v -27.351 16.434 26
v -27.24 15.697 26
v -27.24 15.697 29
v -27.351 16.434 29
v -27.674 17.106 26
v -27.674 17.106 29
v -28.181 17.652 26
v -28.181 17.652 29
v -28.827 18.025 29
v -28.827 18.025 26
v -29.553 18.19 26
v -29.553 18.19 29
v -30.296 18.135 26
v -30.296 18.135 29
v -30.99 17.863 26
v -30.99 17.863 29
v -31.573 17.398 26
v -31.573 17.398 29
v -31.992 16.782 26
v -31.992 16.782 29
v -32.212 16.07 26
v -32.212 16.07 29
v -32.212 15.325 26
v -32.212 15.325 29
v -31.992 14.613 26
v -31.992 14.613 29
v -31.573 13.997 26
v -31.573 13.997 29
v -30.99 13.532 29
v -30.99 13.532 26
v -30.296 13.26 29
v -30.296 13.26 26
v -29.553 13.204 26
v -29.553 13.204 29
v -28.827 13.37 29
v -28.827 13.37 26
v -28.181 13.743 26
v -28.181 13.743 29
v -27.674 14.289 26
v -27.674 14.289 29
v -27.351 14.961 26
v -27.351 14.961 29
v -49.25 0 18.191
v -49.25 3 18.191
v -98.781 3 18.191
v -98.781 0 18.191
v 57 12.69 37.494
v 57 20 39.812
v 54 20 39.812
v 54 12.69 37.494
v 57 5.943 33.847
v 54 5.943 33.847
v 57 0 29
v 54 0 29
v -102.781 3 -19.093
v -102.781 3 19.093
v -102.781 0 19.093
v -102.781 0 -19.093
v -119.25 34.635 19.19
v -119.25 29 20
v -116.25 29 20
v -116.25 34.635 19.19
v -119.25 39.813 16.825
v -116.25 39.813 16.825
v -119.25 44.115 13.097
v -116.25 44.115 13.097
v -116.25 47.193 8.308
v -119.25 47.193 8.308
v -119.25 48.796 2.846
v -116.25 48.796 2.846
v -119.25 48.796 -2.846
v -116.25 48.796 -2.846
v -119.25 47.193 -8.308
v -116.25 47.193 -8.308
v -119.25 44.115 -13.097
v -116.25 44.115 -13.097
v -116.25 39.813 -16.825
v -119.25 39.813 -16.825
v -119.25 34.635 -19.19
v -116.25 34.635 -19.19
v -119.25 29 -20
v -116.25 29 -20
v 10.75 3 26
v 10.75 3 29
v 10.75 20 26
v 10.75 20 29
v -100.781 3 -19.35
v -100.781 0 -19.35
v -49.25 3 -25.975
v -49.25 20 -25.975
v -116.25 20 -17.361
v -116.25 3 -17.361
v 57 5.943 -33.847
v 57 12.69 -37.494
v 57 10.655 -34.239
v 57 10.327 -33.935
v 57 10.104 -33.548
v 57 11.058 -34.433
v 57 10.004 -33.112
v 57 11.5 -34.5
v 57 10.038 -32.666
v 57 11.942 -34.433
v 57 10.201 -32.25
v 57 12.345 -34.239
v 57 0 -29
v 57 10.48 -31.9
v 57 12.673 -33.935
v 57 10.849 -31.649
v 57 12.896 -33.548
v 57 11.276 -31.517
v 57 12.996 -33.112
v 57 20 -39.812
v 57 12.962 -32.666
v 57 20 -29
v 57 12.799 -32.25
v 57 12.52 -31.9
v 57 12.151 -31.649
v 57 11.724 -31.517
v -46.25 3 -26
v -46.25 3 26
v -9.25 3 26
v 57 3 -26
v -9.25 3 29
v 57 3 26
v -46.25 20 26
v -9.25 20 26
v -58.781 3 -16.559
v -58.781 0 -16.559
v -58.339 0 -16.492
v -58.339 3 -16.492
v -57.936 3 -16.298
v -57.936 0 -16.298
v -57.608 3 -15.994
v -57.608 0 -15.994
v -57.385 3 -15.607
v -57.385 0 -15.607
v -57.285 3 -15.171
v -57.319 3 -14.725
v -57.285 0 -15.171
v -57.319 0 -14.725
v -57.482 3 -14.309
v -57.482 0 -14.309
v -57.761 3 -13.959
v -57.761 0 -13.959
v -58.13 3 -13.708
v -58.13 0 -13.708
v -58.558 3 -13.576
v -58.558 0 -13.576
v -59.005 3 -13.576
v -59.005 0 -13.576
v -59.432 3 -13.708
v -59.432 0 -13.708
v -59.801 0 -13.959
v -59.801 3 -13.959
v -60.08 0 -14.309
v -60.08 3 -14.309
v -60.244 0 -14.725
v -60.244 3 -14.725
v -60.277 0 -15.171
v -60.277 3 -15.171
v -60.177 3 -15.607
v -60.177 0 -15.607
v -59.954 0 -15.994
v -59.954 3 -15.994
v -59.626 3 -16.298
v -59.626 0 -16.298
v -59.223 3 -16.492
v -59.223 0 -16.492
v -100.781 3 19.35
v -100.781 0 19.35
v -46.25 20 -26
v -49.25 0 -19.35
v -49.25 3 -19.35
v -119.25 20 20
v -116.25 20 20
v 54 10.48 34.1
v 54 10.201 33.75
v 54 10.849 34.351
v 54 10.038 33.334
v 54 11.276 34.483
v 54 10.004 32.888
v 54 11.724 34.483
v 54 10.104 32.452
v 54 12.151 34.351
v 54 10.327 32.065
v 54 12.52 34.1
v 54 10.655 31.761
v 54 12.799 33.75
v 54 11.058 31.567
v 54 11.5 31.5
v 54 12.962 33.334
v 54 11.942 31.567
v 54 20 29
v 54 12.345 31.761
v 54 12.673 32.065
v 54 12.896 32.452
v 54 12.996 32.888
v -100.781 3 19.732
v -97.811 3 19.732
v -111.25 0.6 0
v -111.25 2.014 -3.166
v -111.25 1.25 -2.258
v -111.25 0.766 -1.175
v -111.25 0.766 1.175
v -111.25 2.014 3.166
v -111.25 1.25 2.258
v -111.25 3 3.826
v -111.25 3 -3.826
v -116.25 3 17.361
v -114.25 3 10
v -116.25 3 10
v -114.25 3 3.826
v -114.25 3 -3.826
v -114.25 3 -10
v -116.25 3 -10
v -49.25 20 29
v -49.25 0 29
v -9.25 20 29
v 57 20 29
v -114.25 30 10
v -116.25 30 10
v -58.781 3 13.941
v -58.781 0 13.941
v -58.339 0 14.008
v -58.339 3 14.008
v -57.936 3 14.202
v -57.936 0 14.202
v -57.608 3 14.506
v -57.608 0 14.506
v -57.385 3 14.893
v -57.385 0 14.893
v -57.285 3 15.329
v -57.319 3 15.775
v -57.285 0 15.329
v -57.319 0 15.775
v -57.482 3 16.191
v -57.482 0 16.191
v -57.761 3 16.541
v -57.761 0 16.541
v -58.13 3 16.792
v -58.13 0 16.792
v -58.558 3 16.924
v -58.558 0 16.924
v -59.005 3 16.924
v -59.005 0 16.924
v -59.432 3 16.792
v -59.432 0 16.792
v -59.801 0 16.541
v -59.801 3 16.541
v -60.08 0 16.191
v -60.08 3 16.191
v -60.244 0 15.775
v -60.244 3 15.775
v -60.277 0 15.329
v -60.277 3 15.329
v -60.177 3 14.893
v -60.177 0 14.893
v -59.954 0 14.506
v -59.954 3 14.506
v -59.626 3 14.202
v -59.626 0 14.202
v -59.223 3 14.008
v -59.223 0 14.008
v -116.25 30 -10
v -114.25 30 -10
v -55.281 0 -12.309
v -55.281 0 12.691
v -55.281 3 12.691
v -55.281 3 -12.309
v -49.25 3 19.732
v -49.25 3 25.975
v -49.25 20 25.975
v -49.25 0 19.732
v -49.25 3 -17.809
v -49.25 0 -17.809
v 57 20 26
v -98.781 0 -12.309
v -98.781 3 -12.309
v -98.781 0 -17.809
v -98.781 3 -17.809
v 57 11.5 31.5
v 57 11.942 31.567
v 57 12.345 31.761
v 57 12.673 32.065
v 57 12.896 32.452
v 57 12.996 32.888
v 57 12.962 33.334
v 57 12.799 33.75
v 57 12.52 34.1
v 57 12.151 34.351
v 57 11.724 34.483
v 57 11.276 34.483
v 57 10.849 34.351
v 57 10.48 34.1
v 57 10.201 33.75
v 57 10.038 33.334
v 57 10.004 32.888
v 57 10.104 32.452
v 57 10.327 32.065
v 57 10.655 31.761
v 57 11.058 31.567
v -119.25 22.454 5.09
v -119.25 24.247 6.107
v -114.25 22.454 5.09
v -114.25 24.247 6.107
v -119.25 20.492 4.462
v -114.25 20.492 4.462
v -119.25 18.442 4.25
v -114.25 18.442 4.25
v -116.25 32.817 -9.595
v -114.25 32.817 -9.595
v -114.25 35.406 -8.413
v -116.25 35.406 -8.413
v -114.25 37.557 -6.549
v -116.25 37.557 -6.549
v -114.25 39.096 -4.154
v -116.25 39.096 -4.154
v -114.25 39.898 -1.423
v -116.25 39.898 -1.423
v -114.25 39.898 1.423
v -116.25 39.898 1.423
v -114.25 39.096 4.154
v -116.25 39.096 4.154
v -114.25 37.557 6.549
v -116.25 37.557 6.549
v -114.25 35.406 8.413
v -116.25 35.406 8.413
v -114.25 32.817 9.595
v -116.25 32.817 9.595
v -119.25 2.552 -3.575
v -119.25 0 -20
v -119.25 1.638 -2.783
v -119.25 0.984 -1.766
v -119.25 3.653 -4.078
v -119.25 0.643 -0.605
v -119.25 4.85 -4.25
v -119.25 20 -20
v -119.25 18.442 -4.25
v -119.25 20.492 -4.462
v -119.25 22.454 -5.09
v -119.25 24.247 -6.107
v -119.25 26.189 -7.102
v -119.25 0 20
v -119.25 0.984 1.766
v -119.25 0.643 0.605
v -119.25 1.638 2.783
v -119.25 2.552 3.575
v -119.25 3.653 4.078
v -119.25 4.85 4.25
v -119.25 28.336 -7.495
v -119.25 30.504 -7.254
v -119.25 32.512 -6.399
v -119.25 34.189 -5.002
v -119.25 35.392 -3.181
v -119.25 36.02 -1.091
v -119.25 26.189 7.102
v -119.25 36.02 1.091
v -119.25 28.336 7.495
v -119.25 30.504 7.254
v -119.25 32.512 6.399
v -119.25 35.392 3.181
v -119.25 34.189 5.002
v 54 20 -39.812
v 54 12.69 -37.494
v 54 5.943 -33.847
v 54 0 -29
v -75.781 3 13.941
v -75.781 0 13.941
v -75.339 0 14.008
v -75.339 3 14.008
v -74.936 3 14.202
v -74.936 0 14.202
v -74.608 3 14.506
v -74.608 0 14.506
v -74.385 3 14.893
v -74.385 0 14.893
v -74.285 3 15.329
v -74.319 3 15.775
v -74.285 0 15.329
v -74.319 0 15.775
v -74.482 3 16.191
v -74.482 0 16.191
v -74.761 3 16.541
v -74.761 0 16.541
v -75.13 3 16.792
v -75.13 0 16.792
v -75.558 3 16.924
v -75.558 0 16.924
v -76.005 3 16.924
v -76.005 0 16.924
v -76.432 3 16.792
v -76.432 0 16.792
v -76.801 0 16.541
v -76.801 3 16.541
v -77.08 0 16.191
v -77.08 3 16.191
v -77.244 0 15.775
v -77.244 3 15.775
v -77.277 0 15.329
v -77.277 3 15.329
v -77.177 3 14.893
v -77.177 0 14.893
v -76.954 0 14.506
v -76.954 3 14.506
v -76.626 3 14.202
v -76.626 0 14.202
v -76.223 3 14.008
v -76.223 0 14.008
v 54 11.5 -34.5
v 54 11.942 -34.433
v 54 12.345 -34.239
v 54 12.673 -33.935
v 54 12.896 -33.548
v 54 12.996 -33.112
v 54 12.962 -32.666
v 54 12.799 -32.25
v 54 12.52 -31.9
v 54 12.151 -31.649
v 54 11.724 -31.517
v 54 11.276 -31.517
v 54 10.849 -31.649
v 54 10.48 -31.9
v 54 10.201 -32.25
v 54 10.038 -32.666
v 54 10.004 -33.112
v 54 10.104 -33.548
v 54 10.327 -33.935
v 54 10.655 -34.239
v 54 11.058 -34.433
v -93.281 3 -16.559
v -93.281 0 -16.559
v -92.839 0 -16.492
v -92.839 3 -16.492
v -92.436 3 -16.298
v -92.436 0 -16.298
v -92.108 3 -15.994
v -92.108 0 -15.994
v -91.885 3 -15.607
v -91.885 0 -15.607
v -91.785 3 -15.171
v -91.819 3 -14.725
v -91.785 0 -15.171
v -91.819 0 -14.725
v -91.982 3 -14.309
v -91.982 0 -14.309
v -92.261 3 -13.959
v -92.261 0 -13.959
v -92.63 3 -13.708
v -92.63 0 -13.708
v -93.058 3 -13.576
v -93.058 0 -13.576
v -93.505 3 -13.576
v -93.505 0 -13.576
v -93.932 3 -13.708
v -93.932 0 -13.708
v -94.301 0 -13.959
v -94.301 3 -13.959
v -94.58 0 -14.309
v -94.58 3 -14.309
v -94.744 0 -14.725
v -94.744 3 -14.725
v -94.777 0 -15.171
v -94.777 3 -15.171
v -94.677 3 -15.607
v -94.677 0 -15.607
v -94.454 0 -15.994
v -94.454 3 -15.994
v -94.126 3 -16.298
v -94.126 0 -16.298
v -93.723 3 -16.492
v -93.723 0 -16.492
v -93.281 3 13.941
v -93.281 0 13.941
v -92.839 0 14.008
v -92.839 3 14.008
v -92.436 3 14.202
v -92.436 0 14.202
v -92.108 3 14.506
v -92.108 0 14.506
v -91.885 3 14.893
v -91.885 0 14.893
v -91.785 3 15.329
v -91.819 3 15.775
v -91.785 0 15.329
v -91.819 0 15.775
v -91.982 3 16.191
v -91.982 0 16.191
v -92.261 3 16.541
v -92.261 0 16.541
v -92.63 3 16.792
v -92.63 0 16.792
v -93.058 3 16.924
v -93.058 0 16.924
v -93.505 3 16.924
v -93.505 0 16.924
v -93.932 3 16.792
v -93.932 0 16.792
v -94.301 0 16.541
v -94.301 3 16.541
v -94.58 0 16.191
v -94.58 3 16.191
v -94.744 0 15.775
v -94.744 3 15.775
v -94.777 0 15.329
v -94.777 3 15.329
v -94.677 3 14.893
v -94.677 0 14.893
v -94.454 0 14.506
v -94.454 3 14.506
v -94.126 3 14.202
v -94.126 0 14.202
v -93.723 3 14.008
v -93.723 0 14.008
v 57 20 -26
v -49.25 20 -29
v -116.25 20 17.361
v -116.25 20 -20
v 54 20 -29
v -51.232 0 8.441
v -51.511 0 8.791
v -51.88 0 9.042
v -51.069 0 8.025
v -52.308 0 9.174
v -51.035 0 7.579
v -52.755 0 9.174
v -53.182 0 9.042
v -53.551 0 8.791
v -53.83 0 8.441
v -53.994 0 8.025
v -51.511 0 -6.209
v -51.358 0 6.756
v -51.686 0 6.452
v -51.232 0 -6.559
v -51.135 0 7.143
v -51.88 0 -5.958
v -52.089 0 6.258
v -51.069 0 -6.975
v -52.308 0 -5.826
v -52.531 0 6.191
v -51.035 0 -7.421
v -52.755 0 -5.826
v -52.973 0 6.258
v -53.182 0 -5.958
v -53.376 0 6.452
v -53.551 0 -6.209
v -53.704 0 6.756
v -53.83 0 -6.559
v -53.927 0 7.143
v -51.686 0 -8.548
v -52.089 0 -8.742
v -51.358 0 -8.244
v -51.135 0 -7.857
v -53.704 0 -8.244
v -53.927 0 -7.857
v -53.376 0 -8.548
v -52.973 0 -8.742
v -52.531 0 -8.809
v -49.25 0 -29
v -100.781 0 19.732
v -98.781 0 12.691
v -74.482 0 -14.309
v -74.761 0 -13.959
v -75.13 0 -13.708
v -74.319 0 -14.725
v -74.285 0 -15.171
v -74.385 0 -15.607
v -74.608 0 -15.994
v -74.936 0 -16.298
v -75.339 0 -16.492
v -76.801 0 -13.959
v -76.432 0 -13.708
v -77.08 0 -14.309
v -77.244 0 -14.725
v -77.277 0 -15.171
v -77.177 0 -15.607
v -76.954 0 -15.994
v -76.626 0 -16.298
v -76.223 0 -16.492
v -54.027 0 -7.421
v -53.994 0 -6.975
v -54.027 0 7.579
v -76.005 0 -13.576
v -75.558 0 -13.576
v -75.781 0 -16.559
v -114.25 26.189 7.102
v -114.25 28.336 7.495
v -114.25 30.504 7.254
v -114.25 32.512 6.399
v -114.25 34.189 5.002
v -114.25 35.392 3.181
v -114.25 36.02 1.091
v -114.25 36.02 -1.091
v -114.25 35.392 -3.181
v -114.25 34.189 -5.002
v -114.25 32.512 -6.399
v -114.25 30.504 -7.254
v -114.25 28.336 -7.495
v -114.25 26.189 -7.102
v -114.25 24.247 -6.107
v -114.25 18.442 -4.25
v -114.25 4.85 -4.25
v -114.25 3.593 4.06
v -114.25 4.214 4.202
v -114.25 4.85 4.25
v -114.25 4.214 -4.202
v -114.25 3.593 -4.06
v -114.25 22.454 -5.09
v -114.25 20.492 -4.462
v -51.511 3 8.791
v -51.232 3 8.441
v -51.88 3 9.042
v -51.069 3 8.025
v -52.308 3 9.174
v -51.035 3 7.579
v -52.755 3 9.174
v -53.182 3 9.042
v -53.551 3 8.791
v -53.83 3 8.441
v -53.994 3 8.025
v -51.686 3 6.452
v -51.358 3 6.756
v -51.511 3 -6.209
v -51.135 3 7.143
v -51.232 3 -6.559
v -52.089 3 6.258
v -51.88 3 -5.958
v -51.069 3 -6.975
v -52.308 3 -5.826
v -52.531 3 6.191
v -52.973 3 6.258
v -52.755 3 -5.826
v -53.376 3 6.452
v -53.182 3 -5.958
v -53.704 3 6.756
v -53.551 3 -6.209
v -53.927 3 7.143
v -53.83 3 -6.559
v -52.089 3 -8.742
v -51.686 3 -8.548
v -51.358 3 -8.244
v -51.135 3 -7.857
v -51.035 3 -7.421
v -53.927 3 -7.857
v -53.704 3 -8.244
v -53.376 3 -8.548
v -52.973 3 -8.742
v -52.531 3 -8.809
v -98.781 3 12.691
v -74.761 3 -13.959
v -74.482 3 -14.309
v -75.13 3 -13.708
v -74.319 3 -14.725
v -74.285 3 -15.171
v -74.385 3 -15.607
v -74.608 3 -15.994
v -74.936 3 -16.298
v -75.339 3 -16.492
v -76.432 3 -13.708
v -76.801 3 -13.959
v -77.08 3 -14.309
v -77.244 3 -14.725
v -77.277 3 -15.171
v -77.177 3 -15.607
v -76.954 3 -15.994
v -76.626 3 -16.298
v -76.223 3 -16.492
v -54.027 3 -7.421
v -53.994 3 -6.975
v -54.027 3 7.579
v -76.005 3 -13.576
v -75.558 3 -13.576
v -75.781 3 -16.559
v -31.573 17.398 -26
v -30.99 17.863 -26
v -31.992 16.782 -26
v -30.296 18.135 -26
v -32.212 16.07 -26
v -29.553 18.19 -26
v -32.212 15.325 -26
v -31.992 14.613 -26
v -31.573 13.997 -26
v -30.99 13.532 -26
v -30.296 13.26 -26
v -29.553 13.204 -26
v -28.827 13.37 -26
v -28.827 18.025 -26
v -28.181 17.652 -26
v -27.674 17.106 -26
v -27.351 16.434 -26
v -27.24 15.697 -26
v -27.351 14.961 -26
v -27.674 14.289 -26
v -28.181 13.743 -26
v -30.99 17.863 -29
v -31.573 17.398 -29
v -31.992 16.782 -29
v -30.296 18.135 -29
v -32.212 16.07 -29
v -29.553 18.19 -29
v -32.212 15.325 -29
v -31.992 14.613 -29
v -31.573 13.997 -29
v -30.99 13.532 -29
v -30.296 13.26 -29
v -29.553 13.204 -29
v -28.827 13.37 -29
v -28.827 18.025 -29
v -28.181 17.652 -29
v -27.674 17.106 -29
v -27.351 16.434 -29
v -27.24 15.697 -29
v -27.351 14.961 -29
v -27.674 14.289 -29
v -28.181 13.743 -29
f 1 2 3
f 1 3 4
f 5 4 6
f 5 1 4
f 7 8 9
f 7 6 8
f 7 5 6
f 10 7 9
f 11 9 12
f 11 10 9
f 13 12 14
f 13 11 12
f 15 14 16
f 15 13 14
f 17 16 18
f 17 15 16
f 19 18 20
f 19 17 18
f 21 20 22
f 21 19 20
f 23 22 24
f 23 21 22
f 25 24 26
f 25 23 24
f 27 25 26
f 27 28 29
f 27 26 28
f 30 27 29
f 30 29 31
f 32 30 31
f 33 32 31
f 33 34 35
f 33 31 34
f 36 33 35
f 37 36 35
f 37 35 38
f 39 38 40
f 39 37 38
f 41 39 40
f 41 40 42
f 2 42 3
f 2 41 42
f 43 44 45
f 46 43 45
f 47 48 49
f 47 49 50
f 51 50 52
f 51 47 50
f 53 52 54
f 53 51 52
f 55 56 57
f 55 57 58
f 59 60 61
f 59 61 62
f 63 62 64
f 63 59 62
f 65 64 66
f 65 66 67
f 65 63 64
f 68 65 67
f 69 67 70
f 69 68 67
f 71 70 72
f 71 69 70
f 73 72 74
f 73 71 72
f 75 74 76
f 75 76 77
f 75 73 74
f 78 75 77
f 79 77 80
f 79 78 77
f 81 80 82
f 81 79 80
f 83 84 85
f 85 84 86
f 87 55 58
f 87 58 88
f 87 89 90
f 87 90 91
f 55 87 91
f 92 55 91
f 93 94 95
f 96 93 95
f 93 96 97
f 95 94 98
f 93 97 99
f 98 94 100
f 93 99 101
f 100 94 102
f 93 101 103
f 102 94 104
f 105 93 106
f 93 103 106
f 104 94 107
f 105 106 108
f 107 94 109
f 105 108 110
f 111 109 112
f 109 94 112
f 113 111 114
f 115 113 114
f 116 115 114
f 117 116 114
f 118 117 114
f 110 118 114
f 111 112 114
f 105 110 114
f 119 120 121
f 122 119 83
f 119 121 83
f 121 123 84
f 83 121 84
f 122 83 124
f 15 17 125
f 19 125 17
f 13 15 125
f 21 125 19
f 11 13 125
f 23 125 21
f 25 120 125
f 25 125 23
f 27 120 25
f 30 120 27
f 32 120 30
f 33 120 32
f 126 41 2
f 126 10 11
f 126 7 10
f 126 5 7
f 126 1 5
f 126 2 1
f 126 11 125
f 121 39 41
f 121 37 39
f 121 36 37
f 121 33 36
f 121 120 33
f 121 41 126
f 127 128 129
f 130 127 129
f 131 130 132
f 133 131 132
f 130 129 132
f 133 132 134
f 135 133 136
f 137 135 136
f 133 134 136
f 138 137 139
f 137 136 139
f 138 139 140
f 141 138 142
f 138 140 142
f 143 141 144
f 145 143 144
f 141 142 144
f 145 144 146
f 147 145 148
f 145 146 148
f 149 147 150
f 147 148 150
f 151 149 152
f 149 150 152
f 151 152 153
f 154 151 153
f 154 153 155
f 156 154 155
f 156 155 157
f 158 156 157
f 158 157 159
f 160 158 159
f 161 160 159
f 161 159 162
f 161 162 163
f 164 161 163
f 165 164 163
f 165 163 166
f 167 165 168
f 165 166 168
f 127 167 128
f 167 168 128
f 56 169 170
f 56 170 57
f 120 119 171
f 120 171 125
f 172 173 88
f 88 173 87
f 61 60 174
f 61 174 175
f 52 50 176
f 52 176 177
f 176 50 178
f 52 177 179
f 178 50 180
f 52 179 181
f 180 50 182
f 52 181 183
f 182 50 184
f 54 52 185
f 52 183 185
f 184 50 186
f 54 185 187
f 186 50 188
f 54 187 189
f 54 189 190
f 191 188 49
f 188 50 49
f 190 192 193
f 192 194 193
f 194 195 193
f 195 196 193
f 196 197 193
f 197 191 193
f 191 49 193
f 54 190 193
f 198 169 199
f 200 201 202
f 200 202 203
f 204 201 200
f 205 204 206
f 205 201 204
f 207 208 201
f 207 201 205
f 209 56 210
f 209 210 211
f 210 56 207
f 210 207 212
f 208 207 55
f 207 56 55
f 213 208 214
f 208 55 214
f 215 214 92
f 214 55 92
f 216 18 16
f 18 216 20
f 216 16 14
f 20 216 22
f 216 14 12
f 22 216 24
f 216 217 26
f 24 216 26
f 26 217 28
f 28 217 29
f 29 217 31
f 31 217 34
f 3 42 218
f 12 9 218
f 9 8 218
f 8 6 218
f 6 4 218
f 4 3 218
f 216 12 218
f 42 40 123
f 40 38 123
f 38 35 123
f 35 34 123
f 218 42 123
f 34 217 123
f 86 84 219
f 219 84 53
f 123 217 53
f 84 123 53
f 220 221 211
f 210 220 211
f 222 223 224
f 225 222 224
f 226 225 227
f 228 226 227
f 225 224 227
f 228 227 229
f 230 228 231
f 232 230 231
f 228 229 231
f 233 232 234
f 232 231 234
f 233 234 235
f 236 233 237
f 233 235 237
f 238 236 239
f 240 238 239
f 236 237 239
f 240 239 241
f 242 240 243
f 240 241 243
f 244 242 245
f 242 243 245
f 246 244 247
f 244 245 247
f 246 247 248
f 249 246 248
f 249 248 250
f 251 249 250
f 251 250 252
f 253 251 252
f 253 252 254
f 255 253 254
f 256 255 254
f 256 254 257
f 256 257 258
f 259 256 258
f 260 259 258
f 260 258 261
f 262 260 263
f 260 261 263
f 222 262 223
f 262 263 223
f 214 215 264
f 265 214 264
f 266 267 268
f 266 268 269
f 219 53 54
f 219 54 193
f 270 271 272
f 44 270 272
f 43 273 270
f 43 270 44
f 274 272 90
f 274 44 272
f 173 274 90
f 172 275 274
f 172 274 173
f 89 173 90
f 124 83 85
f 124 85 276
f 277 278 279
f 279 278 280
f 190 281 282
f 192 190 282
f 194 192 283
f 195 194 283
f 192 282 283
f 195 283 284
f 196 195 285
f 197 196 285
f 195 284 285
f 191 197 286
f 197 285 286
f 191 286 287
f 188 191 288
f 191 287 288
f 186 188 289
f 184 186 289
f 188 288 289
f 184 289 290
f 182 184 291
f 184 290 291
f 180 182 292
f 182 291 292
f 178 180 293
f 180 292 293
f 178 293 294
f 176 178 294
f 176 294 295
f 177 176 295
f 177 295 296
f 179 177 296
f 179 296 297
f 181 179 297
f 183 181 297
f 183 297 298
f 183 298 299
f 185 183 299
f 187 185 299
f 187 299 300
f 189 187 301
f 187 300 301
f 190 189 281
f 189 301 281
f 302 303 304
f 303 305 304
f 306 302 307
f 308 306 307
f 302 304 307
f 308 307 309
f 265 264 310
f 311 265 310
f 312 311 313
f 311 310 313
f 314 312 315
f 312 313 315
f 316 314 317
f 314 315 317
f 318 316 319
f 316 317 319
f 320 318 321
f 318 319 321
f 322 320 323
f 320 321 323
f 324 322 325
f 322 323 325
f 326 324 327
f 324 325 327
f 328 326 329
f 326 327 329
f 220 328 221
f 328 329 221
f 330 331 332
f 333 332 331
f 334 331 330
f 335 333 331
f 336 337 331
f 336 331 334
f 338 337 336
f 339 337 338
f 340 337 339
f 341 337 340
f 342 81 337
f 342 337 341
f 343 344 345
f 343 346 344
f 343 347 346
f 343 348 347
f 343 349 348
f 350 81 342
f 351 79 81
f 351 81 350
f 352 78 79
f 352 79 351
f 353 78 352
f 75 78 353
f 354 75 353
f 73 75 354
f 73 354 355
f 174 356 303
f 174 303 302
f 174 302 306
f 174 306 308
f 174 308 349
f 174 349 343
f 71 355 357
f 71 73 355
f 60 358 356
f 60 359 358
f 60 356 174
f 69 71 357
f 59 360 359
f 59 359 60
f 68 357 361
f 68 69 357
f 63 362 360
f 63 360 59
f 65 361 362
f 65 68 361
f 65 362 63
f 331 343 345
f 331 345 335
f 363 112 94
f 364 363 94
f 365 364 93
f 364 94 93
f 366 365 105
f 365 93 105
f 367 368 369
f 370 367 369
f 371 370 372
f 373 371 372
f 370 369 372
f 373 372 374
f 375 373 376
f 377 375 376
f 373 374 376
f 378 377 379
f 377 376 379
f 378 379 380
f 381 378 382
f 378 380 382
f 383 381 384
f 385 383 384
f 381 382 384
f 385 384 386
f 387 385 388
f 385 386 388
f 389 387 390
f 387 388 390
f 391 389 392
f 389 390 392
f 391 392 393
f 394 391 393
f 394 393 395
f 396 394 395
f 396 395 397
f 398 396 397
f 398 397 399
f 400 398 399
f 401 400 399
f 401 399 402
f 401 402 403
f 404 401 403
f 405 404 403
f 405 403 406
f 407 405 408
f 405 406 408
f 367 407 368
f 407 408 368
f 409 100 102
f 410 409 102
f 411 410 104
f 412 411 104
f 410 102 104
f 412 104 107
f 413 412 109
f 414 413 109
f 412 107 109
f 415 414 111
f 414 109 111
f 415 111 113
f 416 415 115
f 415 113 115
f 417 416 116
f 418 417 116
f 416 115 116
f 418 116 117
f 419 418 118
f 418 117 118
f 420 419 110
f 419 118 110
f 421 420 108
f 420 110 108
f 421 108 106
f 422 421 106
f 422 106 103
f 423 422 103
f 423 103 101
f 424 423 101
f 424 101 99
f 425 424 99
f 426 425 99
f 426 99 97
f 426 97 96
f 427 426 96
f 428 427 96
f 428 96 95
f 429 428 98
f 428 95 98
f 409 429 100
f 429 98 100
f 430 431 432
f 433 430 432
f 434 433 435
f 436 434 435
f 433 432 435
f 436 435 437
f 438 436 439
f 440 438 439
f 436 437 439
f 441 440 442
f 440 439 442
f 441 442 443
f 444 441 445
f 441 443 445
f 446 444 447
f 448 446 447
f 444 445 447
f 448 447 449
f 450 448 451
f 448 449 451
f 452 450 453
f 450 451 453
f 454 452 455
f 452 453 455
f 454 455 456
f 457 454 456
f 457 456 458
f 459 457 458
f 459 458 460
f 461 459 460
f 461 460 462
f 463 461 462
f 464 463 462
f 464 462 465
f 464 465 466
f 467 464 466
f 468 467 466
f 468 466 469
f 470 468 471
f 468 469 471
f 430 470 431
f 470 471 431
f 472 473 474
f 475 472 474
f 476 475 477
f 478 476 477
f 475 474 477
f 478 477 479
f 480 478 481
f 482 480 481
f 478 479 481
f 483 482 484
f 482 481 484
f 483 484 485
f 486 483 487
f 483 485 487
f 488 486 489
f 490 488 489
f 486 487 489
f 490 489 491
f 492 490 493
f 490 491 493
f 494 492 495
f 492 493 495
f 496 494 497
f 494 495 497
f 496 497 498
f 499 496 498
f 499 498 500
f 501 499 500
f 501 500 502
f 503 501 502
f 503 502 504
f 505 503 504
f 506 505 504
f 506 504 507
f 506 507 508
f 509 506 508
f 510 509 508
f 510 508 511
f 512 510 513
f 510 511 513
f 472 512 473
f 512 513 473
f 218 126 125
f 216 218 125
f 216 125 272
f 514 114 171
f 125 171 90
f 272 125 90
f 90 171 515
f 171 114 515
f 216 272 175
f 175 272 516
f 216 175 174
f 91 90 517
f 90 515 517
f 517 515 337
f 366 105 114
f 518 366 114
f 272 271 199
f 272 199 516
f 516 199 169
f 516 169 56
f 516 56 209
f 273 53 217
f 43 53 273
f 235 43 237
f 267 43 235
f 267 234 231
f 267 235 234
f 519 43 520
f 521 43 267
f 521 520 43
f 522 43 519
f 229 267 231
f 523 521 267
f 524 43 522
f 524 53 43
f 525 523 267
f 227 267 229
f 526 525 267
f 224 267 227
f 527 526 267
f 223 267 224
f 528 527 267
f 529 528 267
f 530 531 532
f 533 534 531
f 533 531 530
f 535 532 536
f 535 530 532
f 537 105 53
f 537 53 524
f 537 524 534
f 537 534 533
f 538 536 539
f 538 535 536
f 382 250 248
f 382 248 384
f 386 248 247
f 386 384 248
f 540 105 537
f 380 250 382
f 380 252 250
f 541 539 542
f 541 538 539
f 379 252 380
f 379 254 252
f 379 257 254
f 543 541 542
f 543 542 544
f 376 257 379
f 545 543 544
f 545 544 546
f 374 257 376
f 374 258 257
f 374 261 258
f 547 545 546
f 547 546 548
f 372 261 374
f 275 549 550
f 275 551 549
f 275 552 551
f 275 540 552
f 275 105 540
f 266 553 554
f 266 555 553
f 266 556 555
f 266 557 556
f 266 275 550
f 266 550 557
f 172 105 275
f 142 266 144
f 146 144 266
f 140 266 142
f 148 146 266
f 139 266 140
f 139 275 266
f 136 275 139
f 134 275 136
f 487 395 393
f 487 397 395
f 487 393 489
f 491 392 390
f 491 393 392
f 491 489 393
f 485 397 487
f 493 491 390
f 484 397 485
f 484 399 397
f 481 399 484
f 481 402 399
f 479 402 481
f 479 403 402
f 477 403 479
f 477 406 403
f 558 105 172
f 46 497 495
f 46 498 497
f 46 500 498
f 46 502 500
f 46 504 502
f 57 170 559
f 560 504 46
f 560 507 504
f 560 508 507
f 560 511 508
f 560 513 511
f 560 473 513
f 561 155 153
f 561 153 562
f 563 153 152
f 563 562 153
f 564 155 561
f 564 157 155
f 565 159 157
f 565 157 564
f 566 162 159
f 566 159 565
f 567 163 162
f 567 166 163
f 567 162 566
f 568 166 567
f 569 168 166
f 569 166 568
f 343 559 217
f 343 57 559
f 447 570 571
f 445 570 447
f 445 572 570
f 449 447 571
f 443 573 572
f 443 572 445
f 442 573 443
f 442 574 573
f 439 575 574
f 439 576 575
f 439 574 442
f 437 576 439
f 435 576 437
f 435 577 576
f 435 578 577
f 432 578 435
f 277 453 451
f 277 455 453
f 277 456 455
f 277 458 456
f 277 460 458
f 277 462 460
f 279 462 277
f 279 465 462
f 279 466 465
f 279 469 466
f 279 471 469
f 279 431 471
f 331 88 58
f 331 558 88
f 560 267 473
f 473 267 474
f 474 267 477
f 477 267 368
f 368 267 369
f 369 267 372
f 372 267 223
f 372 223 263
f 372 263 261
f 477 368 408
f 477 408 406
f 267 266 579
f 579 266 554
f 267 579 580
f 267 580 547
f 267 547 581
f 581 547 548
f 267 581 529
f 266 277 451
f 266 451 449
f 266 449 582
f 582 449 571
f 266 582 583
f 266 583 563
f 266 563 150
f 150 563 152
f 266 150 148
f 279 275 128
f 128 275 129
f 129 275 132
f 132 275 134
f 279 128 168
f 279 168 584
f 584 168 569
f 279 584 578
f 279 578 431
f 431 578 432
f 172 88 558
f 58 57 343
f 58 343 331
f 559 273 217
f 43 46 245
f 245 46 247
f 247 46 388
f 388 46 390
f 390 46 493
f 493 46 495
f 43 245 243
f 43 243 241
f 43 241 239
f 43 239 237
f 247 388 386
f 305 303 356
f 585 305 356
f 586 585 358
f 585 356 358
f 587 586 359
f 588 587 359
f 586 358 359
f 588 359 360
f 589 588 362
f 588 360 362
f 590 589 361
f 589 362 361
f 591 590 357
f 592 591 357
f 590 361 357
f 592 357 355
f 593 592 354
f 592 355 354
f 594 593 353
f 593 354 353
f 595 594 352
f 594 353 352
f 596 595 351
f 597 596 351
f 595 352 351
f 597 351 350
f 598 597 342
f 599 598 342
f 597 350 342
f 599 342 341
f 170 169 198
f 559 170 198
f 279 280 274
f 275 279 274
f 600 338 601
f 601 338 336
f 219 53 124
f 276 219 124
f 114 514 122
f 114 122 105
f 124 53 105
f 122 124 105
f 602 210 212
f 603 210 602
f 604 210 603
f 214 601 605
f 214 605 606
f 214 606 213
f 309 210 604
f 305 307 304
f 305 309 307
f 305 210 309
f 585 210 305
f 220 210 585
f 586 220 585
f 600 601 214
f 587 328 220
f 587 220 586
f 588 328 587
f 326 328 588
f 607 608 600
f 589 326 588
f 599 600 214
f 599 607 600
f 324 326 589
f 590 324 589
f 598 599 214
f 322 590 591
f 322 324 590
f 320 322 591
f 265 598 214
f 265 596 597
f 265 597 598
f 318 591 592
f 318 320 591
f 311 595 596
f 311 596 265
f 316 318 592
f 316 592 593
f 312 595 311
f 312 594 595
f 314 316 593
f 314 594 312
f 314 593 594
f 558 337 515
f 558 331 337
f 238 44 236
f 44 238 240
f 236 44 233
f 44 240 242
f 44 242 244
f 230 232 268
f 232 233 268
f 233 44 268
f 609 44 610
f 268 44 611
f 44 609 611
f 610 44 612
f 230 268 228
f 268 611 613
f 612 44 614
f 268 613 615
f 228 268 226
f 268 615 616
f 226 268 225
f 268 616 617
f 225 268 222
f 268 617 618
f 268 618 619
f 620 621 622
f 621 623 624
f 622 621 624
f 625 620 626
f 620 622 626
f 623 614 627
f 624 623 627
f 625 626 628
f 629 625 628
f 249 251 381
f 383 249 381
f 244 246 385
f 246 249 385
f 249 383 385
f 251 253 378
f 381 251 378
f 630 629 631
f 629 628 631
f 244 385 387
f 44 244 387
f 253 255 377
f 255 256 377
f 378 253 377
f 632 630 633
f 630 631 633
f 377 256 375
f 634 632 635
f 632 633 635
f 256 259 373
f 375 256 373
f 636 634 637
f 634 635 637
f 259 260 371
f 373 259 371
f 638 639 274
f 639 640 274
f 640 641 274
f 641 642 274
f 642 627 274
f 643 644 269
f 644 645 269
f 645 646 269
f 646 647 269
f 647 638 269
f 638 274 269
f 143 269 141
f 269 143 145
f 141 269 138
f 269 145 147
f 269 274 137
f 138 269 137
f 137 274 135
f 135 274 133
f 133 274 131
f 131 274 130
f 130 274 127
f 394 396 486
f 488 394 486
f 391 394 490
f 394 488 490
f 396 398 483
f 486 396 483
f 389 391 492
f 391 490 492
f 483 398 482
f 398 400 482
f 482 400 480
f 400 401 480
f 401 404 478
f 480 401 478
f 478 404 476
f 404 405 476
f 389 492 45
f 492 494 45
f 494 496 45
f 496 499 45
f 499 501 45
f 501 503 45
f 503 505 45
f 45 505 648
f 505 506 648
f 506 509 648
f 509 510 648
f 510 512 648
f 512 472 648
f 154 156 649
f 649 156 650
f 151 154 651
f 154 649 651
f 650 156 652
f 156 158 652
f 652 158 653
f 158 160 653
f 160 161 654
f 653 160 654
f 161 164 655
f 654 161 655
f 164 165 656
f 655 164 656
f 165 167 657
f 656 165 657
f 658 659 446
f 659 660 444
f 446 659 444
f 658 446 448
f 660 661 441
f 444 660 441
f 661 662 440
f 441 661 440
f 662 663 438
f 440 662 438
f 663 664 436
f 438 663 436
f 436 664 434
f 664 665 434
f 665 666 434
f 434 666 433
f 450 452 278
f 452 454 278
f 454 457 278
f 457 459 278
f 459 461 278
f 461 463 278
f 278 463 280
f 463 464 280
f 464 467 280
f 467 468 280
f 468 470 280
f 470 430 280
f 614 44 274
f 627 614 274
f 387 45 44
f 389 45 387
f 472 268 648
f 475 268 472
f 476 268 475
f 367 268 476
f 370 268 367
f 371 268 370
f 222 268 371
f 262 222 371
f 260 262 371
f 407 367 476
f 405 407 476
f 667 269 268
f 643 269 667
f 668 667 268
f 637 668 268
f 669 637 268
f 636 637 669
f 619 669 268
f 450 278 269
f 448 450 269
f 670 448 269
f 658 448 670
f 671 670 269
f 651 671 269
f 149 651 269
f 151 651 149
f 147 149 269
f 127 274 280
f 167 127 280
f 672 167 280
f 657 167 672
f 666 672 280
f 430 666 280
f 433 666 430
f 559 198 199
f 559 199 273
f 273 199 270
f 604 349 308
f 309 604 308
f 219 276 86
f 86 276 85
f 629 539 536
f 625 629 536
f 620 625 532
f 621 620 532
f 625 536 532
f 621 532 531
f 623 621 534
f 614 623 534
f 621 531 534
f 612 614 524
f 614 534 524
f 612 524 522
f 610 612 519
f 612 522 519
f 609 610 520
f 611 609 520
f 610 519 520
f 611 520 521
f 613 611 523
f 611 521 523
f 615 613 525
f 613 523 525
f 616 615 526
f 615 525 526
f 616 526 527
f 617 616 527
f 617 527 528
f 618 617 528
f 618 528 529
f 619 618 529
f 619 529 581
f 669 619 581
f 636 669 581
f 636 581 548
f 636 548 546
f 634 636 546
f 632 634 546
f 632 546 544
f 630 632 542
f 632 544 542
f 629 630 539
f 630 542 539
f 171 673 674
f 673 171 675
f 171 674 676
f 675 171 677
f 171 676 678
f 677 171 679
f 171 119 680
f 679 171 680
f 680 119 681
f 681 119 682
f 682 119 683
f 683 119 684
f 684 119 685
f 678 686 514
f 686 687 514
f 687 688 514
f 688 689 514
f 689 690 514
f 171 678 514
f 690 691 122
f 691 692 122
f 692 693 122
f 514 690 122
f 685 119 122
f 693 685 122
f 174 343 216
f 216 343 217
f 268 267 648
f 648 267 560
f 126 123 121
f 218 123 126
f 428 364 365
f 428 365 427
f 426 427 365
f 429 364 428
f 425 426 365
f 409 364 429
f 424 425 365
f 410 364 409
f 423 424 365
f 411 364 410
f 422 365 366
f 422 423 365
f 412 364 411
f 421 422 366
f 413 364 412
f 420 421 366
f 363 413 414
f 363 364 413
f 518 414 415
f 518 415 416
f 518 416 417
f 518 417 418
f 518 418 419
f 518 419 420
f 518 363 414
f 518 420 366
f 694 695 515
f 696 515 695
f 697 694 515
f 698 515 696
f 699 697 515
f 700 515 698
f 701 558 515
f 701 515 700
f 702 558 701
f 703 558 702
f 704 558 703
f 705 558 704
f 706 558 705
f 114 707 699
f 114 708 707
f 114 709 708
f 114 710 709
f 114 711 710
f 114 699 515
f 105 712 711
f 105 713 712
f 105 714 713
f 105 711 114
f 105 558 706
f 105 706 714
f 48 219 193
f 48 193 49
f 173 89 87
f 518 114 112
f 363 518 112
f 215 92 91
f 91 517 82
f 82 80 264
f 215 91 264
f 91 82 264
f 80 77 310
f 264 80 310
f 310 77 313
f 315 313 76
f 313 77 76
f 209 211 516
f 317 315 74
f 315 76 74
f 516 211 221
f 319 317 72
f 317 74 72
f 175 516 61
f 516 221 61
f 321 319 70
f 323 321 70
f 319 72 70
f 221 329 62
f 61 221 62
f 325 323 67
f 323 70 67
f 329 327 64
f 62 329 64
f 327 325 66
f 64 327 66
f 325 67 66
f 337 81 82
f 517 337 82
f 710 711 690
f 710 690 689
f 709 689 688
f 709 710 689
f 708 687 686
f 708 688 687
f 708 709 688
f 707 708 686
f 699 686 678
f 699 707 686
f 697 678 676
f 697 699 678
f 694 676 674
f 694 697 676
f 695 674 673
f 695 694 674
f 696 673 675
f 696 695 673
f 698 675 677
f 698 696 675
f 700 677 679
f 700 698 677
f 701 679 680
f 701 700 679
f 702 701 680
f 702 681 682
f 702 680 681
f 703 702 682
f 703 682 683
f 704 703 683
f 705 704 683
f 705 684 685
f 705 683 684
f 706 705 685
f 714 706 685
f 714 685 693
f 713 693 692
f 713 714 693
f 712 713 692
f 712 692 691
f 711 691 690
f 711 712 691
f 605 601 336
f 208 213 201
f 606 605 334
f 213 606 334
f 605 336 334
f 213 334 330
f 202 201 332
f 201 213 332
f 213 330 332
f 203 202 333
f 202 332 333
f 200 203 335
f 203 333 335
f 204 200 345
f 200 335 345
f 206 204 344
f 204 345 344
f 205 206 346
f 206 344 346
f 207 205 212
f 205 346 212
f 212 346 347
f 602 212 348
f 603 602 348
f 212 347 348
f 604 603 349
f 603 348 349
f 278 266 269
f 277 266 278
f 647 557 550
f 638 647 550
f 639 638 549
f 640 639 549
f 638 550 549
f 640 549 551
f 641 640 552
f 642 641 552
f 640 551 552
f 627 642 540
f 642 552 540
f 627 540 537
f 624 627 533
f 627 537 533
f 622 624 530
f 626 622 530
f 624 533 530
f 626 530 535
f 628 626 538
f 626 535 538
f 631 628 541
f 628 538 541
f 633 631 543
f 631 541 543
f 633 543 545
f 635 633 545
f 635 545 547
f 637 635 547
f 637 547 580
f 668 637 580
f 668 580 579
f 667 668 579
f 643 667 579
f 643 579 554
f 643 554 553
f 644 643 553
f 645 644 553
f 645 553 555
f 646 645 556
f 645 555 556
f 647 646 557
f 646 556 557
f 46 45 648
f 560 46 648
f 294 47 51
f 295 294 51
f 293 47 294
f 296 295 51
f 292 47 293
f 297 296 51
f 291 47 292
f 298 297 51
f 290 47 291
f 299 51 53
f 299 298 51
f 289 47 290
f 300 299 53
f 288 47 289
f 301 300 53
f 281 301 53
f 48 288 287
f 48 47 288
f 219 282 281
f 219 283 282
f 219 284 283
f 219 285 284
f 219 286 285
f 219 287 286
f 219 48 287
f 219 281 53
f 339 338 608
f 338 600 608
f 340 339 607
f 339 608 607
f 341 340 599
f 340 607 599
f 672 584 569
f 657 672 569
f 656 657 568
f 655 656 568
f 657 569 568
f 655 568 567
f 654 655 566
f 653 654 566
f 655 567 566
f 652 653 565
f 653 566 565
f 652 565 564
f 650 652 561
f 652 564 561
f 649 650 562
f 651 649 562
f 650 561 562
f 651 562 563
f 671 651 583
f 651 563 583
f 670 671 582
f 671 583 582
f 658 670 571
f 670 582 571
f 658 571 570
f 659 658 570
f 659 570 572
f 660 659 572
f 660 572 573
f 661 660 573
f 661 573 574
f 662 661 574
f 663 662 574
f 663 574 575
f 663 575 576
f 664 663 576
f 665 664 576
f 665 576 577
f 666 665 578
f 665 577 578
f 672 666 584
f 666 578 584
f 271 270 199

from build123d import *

# Parameters (mm, degrees)
SKETCH2_W               = 106.25
SKETCH2_H               = 58
BOSS_EXTRUDE1_DEPTH     = 3
SKETCH3_W               = 103.25
SKETCH3_H               = 3
BOSS_EXTRUDE2_DEPTH     = 20
SKETCH4_W               = 3
SKETCH4_H               = 40
BOSS_EXTRUDE3_DEPTH     = 29
BOSS_EXTRUDE4_DEPTH     = 17
SKETCH6_R               = 20
BOSS_EXTRUDE5_DEPTH     = 3
SKETCH19_R              = 1.5
BOSS_EXTRUDE9_DEPTH     = 2
CUT_EXTRUDE3_DEPTH      = 142.370302751
CUT_EXTRUDE3_DEPTH_BACK = 142.370302751
SKETCH10_R              = 2.5
SKETCH16_R              = 1.5
BOSS_EXTRUDE8_DEPTH     = 3
BOSS_EXTRUDE8_2_DEPTH   = 3
SKETCH18_W              = 20
SKETCH18_H              = 17
CUT_EXTRUDE5_DEPTH      = 3
SKETCH20_R              = 7.5
CUT_EXTRUDE6_DEPTH      = 8
FILLET1_R               = 10
SKETCH21_R              = 1.5
SKETCH21_W              = 45.5
SKETCH21_H              = 25
CUT_EXTRUDE7_DEPTH      = 3
SKETCH23_W              = 2
SKETCH23_H              = 5.5
CUT_EXTRUDE8_DEPTH      = 3
CUT_EXTRUDE9_DEPTH      = 3


with BuildPart() as part:
    # Sketch2 → Boss-Extrude1 (new body)
    with BuildSketch(Plane(origin=(0, 0, 0), x_dir=(1, 0, 0), z_dir=(0, 1, 0))):
        Polygon((-119.25, 20), (-49.25, 29), (-49.25, -29), (-119.25, -20), align=None)
        with Locations((3.875, 0)):
            Rectangle(SKETCH2_W, SKETCH2_H)
    extrude(amount=BOSS_EXTRUDE1_DEPTH)

    # Sketch3 → Boss-Extrude2 (add)
    with BuildSketch(Plane.XZ):
        with Locations((5.375, 27.5)):
            Rectangle(SKETCH3_W, SKETCH3_H)
        Polygon((-46.25, 29), (-49.25, 29), (-49.25, 25.975305716), (-49.25, -25.975305716), (-49.25, -29), (-46.25, -29), (-46.25, -26), (-46.25, 26), align=None)
        with Locations((5.375, -27.5)):
            Rectangle(SKETCH3_W, SKETCH3_H)
    extrude(amount=-BOSS_EXTRUDE2_DEPTH)

    # Sketch4 → Boss-Extrude3 (add)
    with BuildSketch(Plane.XZ):
        with Locations((-117.75, 0)):
            Rectangle(SKETCH4_W, SKETCH4_H)
    extrude(amount=-BOSS_EXTRUDE3_DEPTH)

    # Sketch5 → Boss-Extrude4 (add)
    with BuildSketch(Plane(origin=(0, 3, 0), x_dir=(1, 0, 0), z_dir=(0, 1, 0))):
        Polygon((-49.25, 25.975305716), (-116.25, 17.361020002), (-119.25, 20), (-49.25, 29), align=None)
        Polygon((-49.25, -25.975305716), (-116.25, -17.361020002), (-119.25, -20), (-49.25, -29), align=None)
    extrude(amount=BOSS_EXTRUDE4_DEPTH)

    # Sketch6 → Boss-Extrude5 (add)
    with BuildSketch(Plane.ZY.offset(119.25)):
        with Locations((0, 29)):
            Circle(SKETCH6_R)
    extrude(amount=-BOSS_EXTRUDE5_DEPTH)

    # Sketch19 → Boss-Extrude9 (add)
    with BuildSketch(Plane(origin=(-116.25, 0, 0), x_dir=(0, 0, -1), z_dir=(1, 0, 0))):
        with BuildLine():
            Line((-9.999999939, 30), (-9.999999939, 0))
            Line((-9.999999939, 0), (9.999999939, 0))
            Line((9.999999939, 0), (9.999999939, 30))
            ThreePointArc((9.999999939, 30), (0, 39.999999939), (-9.999999939, 30))
        make_face()
        with Locations((0, 30)):
            Circle(SKETCH19_R, mode=Mode.SUBTRACT)
    extrude(amount=BOSS_EXTRUDE9_DEPTH)

    # Sketch10 → Cut-Extrude3 (cut, two sides: drawn at the far end of the back side and taken through both)
    with BuildSketch(Plane.XY.offset(29).offset(-CUT_EXTRUDE3_DEPTH_BACK)):
        with Locations((-29.74, 15.69746)):
            Circle(SKETCH10_R)
    extrude(amount=CUT_EXTRUDE3_DEPTH + CUT_EXTRUDE3_DEPTH_BACK, mode=Mode.SUBTRACT)

    # Sketch18 → Cut-Extrude5 (cut)
    with BuildSketch(Plane.XY.offset(29)):
        with Locations((0.75, 11.5)):
            Rectangle(SKETCH18_W, SKETCH18_H)
    extrude(amount=-CUT_EXTRUDE5_DEPTH, mode=Mode.SUBTRACT)

    # Sketch20 → Cut-Extrude6 (cut)
    with BuildSketch(Plane.ZY.offset(119.25)):
        with Locations((0, 28.6)):
            Circle(SKETCH20_R)
        with BuildLine():
            Line((-4.25, 28.6), (-4.25, 4.85))
            ThreePointArc((-4.25, 4.85), (0, 0.6), (4.25, 4.85))
            Line((4.25, 4.85), (4.25, 28.6))
            ThreePointArc((4.25, 28.6), (0, 32.85), (-4.25, 28.6))
        make_face()
    extrude(amount=-CUT_EXTRUDE6_DEPTH, mode=Mode.SUBTRACT)

    # Fillet1
    fillet1_edges = [part.edges().sort_by_distance(p)[0] for p in [
        (-116.75, 22.420396453, -4.25),
        (-116.75, 22.420396453, 4.25),
    ]]
    fillet(fillet1_edges, radius=FILLET1_R)

    # Sketch21 → Cut-Extrude7 (cut)
    with BuildSketch(Plane(origin=(0, 0, 0), x_dir=(-1, 0, 0), z_dir=(0, -1, 0))):
        with Locations(Location((93.281180611, -15.44093997, 0), (0, 0, 90))):
            Circle(SKETCH21_R)
        with Locations(Location((75.781180611, -15.44093997, 0), (0, 0, 90))):
            Circle(SKETCH21_R)
        with Locations(Location((58.781180611, -15.44093997, 0), (0, 0, 90))):
            Circle(SKETCH21_R)
        with Locations(Location((52.531180611, -7.69093997, 0), (0, 0, 90))):
            Circle(SKETCH21_R)
        with Locations(Location((52.531180611, 7.30906003, 0), (0, 0, 90))):
            Circle(SKETCH21_R)
        with Locations(Location((58.781180611, 15.05906003, 0), (0, 0, 90))):
            Circle(SKETCH21_R)
        with Locations(Location((75.781180611, 15.05906003, 0), (0, 0, 90))):
            Circle(SKETCH21_R)
        with Locations(Location((93.281180611, 15.05906003, 0), (0, 0, 90))):
            Circle(SKETCH21_R)
        with Locations((78.031180611, -0.19093997)):
            Rectangle(SKETCH21_W, SKETCH21_H)
    extrude(amount=-CUT_EXTRUDE7_DEPTH, mode=Mode.SUBTRACT)

    # Sketch23 → Cut-Extrude8 (cut)
    with BuildSketch(Plane(origin=(0, 3, 0), x_dir=(1, 0, 0), z_dir=(0, 1, 0))):
        with Locations((-99.781180611, 15.05906003)):
            Rectangle(SKETCH23_W, SKETCH23_H)
        Polygon((-100.781180611, 19.349868209), (-100.781180611, 17.80906003), (-98.781180611, 17.80906003), (-49.25, 17.80906003), (-49.25, 19.349868209), align=None)
        with Locations((-99.781180611, -15.44093997)):
            Rectangle(SKETCH23_W, SKETCH23_H)
        Polygon((-98.781180611, -18.19093997), (-100.781180611, -18.19093997), (-100.781180611, -19.73174815), (-49.25, -19.73174815), (-49.25, -18.19093997), align=None)
    extrude(amount=-CUT_EXTRUDE8_DEPTH, mode=Mode.SUBTRACT)

    # Sketch24 → Cut-Extrude9 (cut)
    with BuildSketch(Plane(origin=(0, 3, 0), x_dir=(1, 0, 0), z_dir=(0, 1, 0))):
        Polygon((-100.781180611, 19.349868209), (-100.781180611, -19.349868209), (-102.781180611, -19.092725352), (-102.781180611, 19.092725352), align=None)
    extrude(amount=-CUT_EXTRUDE9_DEPTH, mode=Mode.SUBTRACT)


with BuildPart() as body_2:
    # Sketch16 → Boss-Extrude8 (new body)
    with BuildSketch(Plane(origin=(57, 0, 0), x_dir=(0, 0, -1), z_dir=(1, 0, 0))):
        with BuildLine():
            Line((-29, 20), (-39.812058475, 20))
            ThreePointArc((-39.812058475, 20), (-35.829803905, 9.230303252), (-29, 0))
            Line((-29, 0), (-29, 20))
        make_face()
        with Locations((-33, 11.5)):
            Circle(SKETCH16_R, mode=Mode.SUBTRACT)
    extrude(amount=-BOSS_EXTRUDE8_DEPTH)


with BuildPart() as body_3:
    # Sketch16 → Boss-Extrude8 2 (new body)
    with BuildSketch(Plane(origin=(57, 0, 0), x_dir=(0, 0, -1), z_dir=(1, 0, 0))):
        with BuildLine():
            Line((29, 20), (39.812058475, 20))
            ThreePointArc((39.812058475, 20), (35.829803905, 9.230303252), (29, 0))
            Line((29, 0), (29, 20))
        make_face()
        with Locations((33, 11.5)):
            Circle(SKETCH16_R, mode=Mode.SUBTRACT)
    extrude(amount=-BOSS_EXTRUDE8_2_DEPTH)


solid = Compound([part.part, body_2.part, body_3.part])
